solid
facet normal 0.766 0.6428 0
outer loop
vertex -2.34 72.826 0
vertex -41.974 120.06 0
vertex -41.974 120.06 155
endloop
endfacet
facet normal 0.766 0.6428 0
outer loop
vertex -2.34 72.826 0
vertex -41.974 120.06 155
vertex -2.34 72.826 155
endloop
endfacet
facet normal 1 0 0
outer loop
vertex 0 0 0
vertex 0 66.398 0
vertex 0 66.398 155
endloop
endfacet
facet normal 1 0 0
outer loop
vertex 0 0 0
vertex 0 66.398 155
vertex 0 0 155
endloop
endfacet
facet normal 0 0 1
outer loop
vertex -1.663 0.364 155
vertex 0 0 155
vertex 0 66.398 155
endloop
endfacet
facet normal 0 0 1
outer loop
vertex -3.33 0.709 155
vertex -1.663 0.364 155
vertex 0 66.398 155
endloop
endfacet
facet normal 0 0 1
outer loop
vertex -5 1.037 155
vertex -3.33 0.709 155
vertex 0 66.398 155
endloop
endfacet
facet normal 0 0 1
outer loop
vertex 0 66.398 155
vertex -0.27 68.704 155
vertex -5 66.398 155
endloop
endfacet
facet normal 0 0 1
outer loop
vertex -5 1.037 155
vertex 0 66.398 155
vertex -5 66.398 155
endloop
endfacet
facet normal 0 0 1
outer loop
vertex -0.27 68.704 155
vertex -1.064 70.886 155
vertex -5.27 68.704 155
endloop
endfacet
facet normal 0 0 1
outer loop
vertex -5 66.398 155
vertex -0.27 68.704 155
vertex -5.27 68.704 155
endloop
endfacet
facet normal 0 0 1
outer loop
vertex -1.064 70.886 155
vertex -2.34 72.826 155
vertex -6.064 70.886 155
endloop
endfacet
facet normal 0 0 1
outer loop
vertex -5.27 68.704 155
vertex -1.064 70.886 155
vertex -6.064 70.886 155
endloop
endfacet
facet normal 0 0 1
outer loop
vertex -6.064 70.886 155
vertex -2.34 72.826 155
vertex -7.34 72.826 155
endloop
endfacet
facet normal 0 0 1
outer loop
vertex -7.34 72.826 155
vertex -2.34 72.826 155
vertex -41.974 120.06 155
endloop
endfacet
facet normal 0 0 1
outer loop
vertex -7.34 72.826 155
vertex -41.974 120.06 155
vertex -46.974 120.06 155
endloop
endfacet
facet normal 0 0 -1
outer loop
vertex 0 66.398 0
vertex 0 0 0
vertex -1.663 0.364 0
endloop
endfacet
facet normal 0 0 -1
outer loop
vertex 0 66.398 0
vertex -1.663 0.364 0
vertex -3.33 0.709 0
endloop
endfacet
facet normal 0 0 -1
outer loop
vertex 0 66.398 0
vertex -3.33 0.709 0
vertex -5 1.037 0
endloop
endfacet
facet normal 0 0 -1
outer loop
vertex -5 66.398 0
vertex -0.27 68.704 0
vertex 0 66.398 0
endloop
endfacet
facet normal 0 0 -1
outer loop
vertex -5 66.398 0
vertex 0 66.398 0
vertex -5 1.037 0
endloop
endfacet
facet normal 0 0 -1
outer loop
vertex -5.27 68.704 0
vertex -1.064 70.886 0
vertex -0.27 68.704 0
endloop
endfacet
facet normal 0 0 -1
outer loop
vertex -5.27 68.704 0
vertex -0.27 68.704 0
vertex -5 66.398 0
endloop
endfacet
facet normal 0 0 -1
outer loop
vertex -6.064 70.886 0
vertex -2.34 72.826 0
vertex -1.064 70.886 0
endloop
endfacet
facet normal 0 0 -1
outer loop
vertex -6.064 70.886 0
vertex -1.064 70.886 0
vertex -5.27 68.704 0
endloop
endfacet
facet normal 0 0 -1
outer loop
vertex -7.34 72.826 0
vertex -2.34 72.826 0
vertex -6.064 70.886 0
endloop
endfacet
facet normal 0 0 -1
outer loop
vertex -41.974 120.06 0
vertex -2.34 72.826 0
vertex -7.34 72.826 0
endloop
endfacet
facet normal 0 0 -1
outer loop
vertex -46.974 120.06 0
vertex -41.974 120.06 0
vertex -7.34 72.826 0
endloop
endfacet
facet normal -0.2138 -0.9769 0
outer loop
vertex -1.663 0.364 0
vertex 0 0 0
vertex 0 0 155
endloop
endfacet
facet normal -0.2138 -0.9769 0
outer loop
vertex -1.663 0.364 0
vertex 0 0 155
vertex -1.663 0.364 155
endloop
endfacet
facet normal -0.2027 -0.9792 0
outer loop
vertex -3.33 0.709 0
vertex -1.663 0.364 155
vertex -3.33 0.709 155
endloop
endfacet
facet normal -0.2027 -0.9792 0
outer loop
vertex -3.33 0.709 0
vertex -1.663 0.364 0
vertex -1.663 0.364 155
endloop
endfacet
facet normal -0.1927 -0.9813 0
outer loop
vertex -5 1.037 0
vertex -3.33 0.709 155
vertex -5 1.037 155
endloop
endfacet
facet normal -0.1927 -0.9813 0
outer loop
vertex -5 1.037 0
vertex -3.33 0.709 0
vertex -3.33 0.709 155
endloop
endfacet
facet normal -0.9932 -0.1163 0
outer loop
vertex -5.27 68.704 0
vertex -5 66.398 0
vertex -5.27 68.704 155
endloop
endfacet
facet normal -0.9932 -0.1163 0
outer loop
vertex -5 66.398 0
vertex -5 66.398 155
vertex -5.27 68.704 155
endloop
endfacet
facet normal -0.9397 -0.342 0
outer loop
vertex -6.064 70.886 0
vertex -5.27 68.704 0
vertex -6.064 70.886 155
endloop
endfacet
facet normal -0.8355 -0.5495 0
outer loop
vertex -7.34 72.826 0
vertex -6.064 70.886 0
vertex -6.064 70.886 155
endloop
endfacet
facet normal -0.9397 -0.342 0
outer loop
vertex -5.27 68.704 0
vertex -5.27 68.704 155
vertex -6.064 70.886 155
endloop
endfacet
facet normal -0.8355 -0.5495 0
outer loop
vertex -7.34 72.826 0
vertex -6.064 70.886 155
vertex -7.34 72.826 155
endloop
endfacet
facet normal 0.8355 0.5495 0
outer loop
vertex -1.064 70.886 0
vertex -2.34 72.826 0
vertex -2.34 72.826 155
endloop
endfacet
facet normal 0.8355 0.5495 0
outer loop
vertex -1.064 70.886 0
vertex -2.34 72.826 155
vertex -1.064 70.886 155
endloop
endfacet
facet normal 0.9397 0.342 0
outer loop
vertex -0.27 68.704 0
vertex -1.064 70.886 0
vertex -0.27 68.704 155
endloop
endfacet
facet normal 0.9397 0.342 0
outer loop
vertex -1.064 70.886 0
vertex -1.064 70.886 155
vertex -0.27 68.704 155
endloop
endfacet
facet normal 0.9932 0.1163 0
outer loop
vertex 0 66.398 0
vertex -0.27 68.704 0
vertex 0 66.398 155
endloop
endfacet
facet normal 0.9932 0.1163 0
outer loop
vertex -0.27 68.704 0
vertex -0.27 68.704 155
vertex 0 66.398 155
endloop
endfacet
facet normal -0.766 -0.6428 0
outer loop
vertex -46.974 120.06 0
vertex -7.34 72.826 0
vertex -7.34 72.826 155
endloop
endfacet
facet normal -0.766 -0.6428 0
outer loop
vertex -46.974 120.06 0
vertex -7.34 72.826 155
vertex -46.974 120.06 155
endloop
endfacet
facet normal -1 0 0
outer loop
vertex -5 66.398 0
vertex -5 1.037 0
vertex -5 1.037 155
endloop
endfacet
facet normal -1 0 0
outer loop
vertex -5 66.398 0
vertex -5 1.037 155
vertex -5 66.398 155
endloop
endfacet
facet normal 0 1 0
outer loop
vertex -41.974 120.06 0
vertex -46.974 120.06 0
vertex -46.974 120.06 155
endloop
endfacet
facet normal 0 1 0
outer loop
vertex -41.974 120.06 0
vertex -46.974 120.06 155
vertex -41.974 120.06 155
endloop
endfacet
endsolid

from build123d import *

# Parameters (mm, degrees)
FUNNEL_LEFT_SIDE_DEPTH = 155
FILLET1_R              = 10


with BuildPart() as part:
    # Sketch1 → Funnel - Left Side (new body)
    with BuildSketch(Plane.XY):
        with BuildLine():
            Line((-5, 1.037386495), (-5, 70.037386495))
            Line((-5, 70.037386495), (-46.974030913, 120.060088631))
            Line((-46.974030913, 120.060088631), (-41.974030913, 120.060088631))
            Line((-41.974030913, 120.060088631), (0, 70.037386495))
            Line((0, 70.037386495), (0, 0))
            ThreePointArc((0, 0), (-2.495861145, 0.538641718), (-5, 1.037386495))
        make_face()
    extrude(amount=FUNNEL_LEFT_SIDE_DEPTH)

    # Fillet1
    fillet1_edges = [part.edges().sort_by_distance(p)[0] for p in [
        (-5, 70.037386495, 77.5),
        (0, 70.037386495, 77.5),
    ]]
    fillet(fillet1_edges, radius=FILLET1_R)


solid = part.part
